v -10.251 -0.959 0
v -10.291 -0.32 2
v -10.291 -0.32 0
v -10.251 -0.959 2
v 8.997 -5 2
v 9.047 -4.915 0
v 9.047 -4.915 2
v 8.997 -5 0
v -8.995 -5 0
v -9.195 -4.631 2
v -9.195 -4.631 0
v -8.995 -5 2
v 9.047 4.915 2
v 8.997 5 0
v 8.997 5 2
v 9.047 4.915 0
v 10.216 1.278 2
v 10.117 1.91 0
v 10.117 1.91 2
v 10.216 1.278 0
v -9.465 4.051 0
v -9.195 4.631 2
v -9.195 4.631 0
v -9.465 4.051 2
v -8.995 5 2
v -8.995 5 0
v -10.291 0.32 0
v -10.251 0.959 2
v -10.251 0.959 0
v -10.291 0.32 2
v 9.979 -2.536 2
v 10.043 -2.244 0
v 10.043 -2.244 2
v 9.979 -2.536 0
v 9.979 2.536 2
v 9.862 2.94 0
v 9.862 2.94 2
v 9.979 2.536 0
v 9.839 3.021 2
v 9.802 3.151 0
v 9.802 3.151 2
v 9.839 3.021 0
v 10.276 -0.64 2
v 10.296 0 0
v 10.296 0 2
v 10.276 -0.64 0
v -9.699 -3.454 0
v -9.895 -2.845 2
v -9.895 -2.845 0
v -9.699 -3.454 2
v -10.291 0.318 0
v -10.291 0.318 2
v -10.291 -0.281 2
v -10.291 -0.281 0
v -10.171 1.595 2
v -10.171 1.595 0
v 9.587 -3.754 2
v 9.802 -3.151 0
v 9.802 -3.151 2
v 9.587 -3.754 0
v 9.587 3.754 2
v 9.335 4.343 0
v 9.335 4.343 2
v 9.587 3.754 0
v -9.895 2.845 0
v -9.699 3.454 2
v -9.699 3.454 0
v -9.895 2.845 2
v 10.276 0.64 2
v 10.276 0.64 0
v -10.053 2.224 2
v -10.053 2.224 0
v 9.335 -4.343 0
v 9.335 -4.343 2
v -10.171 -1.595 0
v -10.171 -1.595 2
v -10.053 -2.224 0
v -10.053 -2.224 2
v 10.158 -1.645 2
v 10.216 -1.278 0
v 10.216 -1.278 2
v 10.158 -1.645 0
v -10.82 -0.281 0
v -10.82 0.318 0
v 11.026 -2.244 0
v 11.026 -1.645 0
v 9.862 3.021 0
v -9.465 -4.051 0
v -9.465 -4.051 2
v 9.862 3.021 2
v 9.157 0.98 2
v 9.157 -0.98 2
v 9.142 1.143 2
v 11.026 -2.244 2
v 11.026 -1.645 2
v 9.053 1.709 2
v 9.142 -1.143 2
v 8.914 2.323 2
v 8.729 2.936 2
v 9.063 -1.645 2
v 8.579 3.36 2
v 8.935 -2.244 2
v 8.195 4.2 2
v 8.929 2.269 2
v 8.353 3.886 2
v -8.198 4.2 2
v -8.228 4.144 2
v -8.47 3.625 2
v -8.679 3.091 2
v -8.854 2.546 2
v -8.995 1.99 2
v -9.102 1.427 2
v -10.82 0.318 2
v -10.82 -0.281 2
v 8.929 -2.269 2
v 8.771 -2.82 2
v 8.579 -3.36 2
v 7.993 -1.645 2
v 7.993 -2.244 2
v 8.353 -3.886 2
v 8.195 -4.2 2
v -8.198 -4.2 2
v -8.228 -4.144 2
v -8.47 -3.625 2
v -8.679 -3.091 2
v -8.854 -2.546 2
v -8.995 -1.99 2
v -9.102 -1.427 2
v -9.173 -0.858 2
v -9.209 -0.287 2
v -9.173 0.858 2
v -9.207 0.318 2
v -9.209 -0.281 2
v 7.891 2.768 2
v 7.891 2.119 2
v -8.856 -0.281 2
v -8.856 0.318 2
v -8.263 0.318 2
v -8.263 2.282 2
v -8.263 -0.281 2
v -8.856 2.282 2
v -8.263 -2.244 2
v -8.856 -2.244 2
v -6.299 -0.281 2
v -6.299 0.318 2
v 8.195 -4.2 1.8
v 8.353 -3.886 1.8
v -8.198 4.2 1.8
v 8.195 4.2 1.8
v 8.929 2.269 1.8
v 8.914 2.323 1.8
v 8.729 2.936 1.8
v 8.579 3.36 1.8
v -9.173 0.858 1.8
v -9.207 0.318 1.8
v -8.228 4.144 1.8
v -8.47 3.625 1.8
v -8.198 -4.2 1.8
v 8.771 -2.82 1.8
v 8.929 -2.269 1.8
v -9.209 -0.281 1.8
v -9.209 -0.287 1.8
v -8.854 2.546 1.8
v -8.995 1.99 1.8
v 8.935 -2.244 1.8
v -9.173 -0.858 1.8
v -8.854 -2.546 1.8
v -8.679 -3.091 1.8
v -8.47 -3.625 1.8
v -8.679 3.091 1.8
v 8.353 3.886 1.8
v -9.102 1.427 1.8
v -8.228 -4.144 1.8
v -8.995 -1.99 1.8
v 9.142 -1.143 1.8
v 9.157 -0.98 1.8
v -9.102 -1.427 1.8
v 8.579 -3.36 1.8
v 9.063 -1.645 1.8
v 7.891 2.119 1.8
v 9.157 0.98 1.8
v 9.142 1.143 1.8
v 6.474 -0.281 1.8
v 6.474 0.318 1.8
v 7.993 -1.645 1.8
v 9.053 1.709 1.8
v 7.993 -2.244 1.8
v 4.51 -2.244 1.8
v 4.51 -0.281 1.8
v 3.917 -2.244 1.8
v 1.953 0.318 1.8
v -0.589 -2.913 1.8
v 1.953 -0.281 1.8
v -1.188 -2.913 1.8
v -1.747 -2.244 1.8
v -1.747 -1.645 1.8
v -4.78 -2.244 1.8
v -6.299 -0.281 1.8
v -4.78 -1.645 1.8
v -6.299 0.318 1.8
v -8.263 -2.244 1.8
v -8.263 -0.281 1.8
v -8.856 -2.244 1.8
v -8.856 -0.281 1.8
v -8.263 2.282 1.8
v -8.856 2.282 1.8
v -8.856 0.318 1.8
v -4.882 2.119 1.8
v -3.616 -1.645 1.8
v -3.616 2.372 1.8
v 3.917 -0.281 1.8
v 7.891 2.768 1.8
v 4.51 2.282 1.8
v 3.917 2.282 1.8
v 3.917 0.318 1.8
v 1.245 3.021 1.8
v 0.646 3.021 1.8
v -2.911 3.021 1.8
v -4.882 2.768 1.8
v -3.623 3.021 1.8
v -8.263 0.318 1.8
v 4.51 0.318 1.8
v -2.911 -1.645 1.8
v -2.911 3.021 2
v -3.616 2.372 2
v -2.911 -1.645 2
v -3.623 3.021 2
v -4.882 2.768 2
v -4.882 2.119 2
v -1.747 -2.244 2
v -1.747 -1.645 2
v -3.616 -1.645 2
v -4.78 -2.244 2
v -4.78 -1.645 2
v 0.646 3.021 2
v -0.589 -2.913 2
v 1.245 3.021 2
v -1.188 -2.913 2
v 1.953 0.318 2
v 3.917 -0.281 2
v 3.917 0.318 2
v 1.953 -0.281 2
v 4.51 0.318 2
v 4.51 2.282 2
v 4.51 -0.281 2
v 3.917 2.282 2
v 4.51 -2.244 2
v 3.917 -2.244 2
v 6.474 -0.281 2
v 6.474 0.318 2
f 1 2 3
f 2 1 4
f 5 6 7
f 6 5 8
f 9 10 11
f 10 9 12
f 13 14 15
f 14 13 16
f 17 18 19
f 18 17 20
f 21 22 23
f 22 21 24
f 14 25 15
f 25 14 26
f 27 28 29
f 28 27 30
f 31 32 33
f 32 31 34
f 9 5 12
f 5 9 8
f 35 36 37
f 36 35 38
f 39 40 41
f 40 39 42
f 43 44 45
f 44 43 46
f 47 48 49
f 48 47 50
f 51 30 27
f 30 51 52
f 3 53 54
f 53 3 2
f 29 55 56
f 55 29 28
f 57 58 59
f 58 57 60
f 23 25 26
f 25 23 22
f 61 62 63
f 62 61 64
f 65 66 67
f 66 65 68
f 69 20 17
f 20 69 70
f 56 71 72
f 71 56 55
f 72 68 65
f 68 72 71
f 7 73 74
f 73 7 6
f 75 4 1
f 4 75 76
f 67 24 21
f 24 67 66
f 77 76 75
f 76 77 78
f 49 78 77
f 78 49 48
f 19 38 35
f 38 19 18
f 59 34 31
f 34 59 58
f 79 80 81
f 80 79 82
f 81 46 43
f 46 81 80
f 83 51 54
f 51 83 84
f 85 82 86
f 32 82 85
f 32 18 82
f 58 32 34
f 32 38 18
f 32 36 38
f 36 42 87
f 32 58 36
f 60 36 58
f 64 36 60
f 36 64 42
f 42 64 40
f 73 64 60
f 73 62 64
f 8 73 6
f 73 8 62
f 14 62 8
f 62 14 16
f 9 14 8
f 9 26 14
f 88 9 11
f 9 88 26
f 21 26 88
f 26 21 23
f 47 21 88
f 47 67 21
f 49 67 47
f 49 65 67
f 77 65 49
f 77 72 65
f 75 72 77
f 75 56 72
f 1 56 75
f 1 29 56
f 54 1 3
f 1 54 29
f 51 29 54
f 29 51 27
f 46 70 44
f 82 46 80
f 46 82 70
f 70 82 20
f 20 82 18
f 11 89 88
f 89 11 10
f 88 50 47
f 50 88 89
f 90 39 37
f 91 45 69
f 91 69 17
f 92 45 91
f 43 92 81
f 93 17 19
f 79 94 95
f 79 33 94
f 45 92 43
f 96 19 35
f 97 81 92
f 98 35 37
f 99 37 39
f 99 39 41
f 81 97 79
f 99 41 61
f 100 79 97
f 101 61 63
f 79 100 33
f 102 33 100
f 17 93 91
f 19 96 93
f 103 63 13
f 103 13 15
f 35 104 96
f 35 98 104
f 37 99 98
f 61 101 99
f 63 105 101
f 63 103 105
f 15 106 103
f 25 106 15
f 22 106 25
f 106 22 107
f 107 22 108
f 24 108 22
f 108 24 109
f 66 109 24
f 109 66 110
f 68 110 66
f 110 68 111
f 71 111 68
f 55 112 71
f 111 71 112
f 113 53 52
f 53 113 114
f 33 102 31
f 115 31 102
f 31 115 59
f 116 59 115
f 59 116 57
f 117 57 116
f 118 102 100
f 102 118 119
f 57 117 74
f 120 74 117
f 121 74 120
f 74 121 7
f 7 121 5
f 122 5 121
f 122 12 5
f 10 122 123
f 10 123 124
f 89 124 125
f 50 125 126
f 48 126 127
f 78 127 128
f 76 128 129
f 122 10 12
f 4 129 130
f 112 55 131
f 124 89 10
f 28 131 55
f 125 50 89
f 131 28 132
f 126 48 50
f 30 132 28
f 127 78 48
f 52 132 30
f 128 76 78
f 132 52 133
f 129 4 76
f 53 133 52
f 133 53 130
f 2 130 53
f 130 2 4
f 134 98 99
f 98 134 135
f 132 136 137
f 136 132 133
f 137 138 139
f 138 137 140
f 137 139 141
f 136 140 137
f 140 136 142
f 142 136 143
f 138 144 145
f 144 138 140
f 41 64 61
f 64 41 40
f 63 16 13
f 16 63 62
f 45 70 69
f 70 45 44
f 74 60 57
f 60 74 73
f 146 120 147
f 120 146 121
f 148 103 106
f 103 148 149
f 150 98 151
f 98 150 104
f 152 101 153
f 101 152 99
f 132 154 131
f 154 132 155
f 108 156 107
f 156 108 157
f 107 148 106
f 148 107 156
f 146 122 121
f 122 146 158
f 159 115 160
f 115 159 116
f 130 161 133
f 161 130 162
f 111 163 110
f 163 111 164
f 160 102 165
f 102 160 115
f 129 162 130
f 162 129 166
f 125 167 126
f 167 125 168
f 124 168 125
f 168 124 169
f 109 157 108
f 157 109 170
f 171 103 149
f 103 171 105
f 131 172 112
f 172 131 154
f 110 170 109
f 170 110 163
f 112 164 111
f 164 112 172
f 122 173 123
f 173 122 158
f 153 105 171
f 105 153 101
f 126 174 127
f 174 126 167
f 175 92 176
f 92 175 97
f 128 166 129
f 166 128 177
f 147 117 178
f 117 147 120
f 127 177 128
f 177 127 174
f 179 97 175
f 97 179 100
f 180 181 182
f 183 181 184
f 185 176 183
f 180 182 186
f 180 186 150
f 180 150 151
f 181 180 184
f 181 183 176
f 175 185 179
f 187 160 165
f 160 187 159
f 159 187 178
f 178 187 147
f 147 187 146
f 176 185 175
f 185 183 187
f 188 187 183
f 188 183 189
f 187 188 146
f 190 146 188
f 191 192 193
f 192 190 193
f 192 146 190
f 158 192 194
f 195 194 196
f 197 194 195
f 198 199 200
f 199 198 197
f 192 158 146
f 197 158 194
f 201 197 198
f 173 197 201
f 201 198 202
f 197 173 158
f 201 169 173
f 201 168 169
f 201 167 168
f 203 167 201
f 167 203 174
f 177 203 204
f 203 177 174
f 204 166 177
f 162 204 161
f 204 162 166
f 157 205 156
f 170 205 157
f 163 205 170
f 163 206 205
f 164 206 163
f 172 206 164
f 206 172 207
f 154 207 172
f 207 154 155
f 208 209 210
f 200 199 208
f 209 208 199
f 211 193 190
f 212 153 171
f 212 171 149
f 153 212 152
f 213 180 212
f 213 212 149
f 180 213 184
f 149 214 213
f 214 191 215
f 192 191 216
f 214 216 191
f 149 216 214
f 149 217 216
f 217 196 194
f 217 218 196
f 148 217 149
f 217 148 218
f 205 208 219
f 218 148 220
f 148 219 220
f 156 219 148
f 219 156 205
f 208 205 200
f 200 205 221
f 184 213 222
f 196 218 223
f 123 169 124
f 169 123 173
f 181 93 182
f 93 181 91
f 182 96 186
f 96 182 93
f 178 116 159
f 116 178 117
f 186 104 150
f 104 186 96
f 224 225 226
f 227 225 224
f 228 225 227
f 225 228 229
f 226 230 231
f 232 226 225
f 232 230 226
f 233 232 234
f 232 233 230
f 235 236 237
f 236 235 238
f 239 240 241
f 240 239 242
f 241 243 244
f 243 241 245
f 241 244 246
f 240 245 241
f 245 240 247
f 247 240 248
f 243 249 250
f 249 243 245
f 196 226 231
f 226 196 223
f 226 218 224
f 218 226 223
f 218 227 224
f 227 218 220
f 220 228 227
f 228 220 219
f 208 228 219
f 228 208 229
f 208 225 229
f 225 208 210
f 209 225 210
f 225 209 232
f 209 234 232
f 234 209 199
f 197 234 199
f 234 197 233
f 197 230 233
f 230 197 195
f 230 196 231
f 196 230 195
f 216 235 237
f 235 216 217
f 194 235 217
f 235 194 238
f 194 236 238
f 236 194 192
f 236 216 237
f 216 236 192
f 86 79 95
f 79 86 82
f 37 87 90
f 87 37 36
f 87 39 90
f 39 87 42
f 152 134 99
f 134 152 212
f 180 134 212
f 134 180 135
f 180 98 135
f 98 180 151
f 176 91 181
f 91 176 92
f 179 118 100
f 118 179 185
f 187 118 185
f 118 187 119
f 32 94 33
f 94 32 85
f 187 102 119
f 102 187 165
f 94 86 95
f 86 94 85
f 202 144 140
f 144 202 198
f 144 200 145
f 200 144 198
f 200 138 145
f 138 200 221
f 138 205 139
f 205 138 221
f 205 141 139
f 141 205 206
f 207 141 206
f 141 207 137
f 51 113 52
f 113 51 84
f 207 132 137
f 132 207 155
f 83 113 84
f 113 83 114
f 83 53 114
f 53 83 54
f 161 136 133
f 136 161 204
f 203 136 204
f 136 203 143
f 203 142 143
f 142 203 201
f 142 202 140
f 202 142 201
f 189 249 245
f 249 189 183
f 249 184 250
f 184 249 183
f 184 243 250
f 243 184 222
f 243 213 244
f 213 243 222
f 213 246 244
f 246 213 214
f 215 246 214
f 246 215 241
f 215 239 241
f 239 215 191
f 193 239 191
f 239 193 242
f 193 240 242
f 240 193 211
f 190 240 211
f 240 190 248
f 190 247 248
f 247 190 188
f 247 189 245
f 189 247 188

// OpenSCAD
token_thickness = 2;
base_thickness = 1.8;
font_face = "Impact:style=Regular";
font_size = 5.2;

token_width = 18;
token_height = 10;

border_thickness = 0.8;

token_text = "+1/+1";

$fn=101;

module pill(w, h) {
    intersection() {
        square([w*2, h], center=true);
        radius = sqrt(w*w/4+h*h/4);
        circle(radius);
    }
}

module base() {
    linear_extrude(height=token_thickness) pill(token_width, token_height);
}

module border_cutout() {
    translate([0, 0, base_thickness]) linear_extrude(height=token_thickness-base_thickness) pill(token_width-border_thickness*2, token_height-border_thickness*2);
}

module token_text(t) {
    linear_extrude(height=token_thickness) text(t, size=font_size, font=font_face, halign="center", valign="center");
}

module token(t) {
    union() {
        difference() {
            base();
            border_cutout();
        }
        token_text(t);
    }
}

token(token_text);
